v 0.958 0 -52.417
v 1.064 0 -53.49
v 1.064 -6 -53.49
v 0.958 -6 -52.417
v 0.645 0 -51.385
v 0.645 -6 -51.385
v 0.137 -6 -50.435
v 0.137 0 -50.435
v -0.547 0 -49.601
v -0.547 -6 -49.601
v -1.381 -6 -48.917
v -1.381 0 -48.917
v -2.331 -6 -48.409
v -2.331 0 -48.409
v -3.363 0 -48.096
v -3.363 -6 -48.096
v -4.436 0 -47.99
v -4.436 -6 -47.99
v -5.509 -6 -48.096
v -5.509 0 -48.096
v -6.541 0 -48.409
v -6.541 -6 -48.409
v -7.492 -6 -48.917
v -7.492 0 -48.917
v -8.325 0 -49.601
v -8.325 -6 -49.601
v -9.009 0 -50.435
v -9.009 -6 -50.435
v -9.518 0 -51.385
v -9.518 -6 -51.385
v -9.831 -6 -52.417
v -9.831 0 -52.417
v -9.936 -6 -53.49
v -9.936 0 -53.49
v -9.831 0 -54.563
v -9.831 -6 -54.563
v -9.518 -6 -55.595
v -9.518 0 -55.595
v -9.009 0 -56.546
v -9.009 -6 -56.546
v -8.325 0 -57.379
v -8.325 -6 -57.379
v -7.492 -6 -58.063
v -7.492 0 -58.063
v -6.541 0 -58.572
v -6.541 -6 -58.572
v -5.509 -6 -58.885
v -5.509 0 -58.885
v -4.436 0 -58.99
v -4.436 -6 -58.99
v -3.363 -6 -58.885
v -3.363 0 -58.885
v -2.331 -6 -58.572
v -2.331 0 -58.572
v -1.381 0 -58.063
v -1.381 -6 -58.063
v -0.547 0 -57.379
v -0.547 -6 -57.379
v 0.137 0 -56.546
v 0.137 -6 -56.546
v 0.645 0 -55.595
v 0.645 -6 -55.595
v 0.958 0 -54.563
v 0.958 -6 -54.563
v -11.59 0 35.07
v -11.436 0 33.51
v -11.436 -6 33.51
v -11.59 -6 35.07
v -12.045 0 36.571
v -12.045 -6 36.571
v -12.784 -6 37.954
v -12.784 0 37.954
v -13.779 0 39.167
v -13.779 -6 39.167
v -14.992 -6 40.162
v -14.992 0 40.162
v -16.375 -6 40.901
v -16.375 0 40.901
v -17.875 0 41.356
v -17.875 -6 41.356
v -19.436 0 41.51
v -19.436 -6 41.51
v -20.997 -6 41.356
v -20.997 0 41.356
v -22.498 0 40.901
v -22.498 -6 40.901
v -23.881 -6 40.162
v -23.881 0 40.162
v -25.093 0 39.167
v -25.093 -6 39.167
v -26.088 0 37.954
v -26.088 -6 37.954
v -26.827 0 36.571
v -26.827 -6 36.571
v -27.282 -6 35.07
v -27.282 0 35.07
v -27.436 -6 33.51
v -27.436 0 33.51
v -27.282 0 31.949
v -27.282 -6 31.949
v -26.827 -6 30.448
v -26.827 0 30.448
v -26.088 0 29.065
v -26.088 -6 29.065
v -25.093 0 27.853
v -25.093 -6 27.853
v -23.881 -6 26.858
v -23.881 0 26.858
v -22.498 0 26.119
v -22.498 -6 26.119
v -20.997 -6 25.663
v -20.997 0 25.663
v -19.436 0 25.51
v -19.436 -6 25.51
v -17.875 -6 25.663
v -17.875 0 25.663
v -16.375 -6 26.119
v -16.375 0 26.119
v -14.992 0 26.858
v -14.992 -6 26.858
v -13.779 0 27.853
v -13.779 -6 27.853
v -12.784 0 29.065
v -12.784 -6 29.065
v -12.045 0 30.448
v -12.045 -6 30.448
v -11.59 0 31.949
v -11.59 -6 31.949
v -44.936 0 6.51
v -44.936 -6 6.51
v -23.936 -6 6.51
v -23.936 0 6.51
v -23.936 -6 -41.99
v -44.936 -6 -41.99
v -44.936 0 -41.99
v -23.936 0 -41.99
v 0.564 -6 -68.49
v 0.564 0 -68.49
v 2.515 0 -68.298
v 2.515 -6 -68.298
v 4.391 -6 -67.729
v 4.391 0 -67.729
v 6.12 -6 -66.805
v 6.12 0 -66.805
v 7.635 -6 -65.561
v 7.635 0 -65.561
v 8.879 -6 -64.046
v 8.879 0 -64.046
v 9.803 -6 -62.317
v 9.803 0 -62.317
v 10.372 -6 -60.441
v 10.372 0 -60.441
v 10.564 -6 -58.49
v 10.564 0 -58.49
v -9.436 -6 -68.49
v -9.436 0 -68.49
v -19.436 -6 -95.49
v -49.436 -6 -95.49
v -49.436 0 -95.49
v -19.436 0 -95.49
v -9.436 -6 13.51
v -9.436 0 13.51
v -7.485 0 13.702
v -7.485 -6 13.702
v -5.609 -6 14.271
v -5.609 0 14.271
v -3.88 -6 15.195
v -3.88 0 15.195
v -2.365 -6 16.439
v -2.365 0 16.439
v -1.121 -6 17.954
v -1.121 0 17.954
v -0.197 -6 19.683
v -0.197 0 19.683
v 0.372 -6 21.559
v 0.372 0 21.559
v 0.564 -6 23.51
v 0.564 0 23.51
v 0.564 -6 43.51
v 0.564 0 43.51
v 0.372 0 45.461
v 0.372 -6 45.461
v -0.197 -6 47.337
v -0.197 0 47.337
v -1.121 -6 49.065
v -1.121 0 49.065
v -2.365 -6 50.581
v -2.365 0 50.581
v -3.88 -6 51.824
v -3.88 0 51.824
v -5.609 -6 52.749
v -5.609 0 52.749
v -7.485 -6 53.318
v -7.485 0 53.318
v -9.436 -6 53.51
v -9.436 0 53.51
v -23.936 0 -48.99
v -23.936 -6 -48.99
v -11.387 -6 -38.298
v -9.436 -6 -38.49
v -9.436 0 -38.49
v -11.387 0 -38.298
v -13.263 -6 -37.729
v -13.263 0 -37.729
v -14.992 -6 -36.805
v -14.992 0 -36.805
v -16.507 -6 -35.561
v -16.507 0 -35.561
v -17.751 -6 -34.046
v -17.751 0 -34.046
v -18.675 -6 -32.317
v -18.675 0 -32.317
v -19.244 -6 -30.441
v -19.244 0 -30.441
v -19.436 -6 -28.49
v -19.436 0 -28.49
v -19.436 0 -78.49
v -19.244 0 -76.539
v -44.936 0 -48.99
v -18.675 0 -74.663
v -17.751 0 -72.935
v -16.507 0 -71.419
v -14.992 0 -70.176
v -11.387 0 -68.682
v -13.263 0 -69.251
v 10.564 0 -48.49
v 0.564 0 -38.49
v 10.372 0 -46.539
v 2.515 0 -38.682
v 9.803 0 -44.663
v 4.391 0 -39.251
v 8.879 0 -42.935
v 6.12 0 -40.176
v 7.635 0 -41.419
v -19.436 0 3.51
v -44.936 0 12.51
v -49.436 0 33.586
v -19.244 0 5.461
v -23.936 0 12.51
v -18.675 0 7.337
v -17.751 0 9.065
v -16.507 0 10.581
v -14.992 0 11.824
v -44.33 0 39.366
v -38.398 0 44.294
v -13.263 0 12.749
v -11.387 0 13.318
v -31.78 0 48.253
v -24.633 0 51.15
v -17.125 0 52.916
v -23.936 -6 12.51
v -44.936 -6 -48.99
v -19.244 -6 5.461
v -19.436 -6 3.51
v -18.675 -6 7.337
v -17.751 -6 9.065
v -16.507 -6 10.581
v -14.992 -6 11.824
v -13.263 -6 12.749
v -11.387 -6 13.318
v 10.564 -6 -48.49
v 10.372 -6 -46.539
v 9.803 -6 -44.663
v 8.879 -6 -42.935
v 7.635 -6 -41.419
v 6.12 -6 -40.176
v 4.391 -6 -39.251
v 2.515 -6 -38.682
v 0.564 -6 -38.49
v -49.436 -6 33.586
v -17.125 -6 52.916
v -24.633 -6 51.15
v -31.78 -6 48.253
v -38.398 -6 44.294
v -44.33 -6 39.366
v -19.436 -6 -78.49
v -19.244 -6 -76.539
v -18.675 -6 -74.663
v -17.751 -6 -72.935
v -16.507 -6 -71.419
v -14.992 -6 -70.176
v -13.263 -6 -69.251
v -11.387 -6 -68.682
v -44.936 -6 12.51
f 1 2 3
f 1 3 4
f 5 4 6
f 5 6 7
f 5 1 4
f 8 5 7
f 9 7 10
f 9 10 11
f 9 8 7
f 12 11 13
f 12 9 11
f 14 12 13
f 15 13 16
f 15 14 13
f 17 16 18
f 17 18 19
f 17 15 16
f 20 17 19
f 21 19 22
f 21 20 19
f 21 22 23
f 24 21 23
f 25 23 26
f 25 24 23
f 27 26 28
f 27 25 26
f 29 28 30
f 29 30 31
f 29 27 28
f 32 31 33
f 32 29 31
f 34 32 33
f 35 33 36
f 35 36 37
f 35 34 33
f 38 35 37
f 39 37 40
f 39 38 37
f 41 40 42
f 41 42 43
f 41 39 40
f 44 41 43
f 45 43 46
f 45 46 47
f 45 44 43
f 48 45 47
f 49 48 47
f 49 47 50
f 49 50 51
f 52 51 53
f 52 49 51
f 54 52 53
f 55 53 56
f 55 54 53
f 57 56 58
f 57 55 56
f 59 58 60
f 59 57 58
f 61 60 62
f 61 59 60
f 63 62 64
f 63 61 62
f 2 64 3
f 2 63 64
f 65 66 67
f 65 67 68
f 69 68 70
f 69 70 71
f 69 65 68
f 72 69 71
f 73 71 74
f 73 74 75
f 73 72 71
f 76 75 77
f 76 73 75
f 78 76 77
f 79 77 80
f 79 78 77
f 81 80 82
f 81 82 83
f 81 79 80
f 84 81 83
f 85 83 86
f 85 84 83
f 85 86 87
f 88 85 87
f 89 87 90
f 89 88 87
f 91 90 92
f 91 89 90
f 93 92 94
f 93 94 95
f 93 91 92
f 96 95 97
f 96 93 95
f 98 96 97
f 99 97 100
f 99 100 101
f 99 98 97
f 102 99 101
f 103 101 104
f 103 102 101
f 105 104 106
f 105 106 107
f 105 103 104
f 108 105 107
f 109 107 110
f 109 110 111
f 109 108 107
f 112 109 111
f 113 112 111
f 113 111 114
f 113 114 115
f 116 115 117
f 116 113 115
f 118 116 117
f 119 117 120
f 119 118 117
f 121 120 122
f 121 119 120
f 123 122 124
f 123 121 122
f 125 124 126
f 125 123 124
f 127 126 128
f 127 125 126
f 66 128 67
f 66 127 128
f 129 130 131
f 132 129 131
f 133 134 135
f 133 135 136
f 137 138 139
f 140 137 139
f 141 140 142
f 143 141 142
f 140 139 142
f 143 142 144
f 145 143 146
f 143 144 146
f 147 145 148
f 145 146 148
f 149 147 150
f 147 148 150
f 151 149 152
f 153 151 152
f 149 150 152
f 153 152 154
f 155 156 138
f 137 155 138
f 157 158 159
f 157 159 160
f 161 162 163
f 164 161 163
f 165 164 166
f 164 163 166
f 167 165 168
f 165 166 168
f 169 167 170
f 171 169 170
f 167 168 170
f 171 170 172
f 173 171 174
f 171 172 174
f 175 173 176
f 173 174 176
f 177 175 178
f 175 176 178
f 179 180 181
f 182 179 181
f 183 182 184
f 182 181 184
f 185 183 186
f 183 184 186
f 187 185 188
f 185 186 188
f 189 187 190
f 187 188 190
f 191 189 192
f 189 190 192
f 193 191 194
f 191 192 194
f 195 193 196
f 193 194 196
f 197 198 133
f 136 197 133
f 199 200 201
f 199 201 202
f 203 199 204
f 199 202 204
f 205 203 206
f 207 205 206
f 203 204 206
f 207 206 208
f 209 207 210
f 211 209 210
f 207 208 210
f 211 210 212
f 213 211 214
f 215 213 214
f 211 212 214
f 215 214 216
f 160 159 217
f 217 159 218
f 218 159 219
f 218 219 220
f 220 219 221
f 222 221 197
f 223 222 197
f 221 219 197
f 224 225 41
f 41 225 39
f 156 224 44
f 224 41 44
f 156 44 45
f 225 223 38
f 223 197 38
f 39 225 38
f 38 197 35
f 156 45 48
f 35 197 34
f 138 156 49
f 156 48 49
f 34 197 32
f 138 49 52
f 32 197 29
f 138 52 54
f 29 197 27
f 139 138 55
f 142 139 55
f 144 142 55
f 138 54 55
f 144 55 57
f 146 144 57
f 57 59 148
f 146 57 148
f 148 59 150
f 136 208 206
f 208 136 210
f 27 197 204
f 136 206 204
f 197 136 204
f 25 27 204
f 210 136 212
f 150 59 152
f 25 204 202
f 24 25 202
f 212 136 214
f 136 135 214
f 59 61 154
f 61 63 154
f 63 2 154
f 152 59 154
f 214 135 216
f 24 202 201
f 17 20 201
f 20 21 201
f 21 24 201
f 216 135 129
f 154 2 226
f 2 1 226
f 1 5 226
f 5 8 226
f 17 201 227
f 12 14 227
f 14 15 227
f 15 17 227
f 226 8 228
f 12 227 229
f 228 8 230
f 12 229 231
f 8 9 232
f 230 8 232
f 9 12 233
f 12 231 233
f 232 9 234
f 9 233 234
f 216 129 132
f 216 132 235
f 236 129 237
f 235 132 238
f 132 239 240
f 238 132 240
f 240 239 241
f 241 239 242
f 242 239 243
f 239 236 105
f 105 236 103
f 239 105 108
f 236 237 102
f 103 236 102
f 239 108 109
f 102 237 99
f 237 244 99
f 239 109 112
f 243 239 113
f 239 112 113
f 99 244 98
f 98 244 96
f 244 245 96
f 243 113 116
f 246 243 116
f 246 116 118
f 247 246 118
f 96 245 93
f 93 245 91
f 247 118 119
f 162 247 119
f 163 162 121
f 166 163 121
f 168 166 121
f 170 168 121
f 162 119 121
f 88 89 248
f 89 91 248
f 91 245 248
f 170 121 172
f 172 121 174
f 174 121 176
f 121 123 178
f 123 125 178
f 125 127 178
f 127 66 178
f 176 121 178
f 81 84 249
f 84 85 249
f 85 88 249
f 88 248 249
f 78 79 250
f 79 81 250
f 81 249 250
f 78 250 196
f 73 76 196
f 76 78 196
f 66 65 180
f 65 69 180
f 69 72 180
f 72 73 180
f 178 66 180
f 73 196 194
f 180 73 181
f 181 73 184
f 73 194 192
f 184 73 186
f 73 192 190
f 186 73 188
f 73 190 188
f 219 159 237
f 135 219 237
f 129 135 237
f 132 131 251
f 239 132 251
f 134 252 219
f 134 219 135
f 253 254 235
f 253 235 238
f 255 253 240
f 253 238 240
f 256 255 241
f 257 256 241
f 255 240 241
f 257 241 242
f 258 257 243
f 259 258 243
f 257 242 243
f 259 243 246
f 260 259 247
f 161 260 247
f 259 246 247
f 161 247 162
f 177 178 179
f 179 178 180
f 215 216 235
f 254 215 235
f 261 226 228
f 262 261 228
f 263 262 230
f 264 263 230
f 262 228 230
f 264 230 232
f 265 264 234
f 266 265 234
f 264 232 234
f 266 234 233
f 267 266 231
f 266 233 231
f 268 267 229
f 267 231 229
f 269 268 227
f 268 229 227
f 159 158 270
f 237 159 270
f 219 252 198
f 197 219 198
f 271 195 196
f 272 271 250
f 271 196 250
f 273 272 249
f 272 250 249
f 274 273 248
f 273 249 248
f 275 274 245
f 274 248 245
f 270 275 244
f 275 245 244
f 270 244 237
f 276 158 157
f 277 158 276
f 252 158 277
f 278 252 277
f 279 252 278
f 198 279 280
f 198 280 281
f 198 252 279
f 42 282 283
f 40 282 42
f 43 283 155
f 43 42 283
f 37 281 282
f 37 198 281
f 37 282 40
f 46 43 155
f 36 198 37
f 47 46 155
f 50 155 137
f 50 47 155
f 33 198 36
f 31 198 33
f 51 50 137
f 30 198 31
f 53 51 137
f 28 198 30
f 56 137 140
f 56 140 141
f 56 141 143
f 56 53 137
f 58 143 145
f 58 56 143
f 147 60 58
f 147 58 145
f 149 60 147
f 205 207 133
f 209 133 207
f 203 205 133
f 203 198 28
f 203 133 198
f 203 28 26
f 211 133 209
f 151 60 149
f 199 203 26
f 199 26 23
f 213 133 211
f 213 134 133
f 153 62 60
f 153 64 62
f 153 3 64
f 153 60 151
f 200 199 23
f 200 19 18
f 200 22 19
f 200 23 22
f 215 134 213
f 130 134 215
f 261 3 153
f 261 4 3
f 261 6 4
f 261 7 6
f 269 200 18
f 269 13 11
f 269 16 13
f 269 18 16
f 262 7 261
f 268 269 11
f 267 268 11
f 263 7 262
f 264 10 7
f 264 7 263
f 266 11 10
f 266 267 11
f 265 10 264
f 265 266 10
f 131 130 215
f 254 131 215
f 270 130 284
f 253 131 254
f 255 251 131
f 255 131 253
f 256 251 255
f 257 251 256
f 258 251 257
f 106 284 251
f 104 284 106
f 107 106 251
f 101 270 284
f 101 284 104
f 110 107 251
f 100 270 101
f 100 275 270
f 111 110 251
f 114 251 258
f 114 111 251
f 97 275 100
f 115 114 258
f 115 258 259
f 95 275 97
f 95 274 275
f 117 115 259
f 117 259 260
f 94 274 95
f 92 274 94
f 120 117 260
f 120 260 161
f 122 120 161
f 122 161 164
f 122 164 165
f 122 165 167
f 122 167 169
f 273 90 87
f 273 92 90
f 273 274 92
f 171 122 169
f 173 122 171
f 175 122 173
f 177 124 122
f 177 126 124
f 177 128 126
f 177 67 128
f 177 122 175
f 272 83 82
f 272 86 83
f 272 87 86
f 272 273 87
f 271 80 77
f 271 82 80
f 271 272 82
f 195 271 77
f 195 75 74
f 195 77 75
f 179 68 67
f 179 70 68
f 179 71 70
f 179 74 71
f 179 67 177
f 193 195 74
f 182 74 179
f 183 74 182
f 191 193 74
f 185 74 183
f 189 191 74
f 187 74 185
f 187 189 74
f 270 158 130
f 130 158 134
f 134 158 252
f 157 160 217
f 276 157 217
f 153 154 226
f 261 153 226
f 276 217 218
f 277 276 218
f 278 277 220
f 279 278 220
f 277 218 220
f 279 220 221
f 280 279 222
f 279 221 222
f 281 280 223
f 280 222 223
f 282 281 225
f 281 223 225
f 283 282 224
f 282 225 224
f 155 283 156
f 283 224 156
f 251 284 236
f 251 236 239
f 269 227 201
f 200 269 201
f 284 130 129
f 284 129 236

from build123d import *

# Parameters (mm, degrees)
F0_R     = 5.5
F0_R_2   = 8
F1_DEPTH = 6
F3_DEPTH = 25
F4_W     = 30
F4_H     = 6
F5_DEPTH = 25
F6_W     = 21
F6_H     = 7
F6_H_2   = 6
F7_DEPTH = 25


with BuildPart() as f1:
    # F0 (on Front) → F1 (new body)
    with BuildSketch(Plane.XZ):
        with BuildLine():
            Line((-59.436191, 0), (-59.436191, -101.490244))
            Line((-59.436191, -101.490244), (-19.436191, -101.490244))
            Line((-19.436191, -101.490244), (-19.436191, -78.490244))
            ThreePointArc((-19.436191, -78.490244), (-16.507259, -71.419176), (-9.436191, -68.490244))
            Line((-9.436191, -68.490244), (0.563809, -68.490244))
            ThreePointArc((0.563809, -68.490244), (7.634877, -65.561312), (10.563809, -58.490244))
            Line((10.563809, -58.490244), (10.563809, -53.490244))
            Line((10.563809, -53.490244), (10.563809, -48.490244))
            ThreePointArc((10.563809, -48.490244), (7.634877, -41.419176), (0.563809, -38.490244))
            Line((0.563809, -38.490244), (-4.436191, -38.490244))
            Line((-4.436191, -38.490244), (-9.436191, -38.490244))
            ThreePointArc((-9.436191, -38.490244), (-16.507259, -35.561312), (-19.436191, -28.490244))
            Line((-19.436191, -28.490244), (-19.436191, 3.509756))
            ThreePointArc((-19.436191, 3.509756), (-16.507259, 10.580824), (-9.436191, 13.509756))
            ThreePointArc((-9.436191, 13.509756), (-2.365123, 16.438688), (0.563809, 23.509756))
            Line((0.563809, 23.509756), (0.563809, 33.509756))
            Line((0.563809, 33.509756), (0.563809, 43.509756))
            ThreePointArc((0.563809, 43.509756), (-2.365123, 50.580824), (-9.436191, 53.509756))
            ThreePointArc((-9.436191, 53.509756), (-43.651687, 40.011908), (-59.436191, 6.789303))
            Line((-59.436191, 6.789303), (-59.436191, 0))
        make_face()
        with Locations((-4.436191, -53.490244)):
            Circle(F0_R, mode=Mode.SUBTRACT)
        with Locations((-19.436191, 33.509756)):
            Circle(F0_R_2, mode=Mode.SUBTRACT)
    extrude(amount=F1_DEPTH)

    # F2 (on face) → F3 (cut)
    with BuildSketch(Plane.XZ.offset(6)):
        with BuildLine():
            Line((-59.436191, 6.789303), (-59.436191, -101.490244))
            Line((-59.436191, -101.490244), (-49.436191, -101.490244))
            Line((-49.436191, -101.490244), (-49.436191, 33.586102))
            ThreePointArc((-49.436191, 33.586102), (-56.388476, 20.916254), (-59.436191, 6.789303))
        make_face()
    extrude(amount=-F3_DEPTH, mode=Mode.SUBTRACT)

    # F4 (on face) → F5 (cut)
    with BuildSketch(Plane.XZ.offset(6)):
        with Locations((-34.436191, -98.490244)):
            Rectangle(F4_W, F4_H)
    extrude(amount=-F5_DEPTH, mode=Mode.SUBTRACT)

    # F6 (on face) → F7 (cut)
    with BuildSketch(Plane.XZ.offset(6)):
        with Locations((-34.436191, -45.490244)):
            Rectangle(F6_W, F6_H)
        with Locations((-34.436191, 9.509756)):
            Rectangle(F6_W, F6_H_2)
    extrude(amount=-F7_DEPTH, mode=Mode.SUBTRACT)


solid = f1.part
